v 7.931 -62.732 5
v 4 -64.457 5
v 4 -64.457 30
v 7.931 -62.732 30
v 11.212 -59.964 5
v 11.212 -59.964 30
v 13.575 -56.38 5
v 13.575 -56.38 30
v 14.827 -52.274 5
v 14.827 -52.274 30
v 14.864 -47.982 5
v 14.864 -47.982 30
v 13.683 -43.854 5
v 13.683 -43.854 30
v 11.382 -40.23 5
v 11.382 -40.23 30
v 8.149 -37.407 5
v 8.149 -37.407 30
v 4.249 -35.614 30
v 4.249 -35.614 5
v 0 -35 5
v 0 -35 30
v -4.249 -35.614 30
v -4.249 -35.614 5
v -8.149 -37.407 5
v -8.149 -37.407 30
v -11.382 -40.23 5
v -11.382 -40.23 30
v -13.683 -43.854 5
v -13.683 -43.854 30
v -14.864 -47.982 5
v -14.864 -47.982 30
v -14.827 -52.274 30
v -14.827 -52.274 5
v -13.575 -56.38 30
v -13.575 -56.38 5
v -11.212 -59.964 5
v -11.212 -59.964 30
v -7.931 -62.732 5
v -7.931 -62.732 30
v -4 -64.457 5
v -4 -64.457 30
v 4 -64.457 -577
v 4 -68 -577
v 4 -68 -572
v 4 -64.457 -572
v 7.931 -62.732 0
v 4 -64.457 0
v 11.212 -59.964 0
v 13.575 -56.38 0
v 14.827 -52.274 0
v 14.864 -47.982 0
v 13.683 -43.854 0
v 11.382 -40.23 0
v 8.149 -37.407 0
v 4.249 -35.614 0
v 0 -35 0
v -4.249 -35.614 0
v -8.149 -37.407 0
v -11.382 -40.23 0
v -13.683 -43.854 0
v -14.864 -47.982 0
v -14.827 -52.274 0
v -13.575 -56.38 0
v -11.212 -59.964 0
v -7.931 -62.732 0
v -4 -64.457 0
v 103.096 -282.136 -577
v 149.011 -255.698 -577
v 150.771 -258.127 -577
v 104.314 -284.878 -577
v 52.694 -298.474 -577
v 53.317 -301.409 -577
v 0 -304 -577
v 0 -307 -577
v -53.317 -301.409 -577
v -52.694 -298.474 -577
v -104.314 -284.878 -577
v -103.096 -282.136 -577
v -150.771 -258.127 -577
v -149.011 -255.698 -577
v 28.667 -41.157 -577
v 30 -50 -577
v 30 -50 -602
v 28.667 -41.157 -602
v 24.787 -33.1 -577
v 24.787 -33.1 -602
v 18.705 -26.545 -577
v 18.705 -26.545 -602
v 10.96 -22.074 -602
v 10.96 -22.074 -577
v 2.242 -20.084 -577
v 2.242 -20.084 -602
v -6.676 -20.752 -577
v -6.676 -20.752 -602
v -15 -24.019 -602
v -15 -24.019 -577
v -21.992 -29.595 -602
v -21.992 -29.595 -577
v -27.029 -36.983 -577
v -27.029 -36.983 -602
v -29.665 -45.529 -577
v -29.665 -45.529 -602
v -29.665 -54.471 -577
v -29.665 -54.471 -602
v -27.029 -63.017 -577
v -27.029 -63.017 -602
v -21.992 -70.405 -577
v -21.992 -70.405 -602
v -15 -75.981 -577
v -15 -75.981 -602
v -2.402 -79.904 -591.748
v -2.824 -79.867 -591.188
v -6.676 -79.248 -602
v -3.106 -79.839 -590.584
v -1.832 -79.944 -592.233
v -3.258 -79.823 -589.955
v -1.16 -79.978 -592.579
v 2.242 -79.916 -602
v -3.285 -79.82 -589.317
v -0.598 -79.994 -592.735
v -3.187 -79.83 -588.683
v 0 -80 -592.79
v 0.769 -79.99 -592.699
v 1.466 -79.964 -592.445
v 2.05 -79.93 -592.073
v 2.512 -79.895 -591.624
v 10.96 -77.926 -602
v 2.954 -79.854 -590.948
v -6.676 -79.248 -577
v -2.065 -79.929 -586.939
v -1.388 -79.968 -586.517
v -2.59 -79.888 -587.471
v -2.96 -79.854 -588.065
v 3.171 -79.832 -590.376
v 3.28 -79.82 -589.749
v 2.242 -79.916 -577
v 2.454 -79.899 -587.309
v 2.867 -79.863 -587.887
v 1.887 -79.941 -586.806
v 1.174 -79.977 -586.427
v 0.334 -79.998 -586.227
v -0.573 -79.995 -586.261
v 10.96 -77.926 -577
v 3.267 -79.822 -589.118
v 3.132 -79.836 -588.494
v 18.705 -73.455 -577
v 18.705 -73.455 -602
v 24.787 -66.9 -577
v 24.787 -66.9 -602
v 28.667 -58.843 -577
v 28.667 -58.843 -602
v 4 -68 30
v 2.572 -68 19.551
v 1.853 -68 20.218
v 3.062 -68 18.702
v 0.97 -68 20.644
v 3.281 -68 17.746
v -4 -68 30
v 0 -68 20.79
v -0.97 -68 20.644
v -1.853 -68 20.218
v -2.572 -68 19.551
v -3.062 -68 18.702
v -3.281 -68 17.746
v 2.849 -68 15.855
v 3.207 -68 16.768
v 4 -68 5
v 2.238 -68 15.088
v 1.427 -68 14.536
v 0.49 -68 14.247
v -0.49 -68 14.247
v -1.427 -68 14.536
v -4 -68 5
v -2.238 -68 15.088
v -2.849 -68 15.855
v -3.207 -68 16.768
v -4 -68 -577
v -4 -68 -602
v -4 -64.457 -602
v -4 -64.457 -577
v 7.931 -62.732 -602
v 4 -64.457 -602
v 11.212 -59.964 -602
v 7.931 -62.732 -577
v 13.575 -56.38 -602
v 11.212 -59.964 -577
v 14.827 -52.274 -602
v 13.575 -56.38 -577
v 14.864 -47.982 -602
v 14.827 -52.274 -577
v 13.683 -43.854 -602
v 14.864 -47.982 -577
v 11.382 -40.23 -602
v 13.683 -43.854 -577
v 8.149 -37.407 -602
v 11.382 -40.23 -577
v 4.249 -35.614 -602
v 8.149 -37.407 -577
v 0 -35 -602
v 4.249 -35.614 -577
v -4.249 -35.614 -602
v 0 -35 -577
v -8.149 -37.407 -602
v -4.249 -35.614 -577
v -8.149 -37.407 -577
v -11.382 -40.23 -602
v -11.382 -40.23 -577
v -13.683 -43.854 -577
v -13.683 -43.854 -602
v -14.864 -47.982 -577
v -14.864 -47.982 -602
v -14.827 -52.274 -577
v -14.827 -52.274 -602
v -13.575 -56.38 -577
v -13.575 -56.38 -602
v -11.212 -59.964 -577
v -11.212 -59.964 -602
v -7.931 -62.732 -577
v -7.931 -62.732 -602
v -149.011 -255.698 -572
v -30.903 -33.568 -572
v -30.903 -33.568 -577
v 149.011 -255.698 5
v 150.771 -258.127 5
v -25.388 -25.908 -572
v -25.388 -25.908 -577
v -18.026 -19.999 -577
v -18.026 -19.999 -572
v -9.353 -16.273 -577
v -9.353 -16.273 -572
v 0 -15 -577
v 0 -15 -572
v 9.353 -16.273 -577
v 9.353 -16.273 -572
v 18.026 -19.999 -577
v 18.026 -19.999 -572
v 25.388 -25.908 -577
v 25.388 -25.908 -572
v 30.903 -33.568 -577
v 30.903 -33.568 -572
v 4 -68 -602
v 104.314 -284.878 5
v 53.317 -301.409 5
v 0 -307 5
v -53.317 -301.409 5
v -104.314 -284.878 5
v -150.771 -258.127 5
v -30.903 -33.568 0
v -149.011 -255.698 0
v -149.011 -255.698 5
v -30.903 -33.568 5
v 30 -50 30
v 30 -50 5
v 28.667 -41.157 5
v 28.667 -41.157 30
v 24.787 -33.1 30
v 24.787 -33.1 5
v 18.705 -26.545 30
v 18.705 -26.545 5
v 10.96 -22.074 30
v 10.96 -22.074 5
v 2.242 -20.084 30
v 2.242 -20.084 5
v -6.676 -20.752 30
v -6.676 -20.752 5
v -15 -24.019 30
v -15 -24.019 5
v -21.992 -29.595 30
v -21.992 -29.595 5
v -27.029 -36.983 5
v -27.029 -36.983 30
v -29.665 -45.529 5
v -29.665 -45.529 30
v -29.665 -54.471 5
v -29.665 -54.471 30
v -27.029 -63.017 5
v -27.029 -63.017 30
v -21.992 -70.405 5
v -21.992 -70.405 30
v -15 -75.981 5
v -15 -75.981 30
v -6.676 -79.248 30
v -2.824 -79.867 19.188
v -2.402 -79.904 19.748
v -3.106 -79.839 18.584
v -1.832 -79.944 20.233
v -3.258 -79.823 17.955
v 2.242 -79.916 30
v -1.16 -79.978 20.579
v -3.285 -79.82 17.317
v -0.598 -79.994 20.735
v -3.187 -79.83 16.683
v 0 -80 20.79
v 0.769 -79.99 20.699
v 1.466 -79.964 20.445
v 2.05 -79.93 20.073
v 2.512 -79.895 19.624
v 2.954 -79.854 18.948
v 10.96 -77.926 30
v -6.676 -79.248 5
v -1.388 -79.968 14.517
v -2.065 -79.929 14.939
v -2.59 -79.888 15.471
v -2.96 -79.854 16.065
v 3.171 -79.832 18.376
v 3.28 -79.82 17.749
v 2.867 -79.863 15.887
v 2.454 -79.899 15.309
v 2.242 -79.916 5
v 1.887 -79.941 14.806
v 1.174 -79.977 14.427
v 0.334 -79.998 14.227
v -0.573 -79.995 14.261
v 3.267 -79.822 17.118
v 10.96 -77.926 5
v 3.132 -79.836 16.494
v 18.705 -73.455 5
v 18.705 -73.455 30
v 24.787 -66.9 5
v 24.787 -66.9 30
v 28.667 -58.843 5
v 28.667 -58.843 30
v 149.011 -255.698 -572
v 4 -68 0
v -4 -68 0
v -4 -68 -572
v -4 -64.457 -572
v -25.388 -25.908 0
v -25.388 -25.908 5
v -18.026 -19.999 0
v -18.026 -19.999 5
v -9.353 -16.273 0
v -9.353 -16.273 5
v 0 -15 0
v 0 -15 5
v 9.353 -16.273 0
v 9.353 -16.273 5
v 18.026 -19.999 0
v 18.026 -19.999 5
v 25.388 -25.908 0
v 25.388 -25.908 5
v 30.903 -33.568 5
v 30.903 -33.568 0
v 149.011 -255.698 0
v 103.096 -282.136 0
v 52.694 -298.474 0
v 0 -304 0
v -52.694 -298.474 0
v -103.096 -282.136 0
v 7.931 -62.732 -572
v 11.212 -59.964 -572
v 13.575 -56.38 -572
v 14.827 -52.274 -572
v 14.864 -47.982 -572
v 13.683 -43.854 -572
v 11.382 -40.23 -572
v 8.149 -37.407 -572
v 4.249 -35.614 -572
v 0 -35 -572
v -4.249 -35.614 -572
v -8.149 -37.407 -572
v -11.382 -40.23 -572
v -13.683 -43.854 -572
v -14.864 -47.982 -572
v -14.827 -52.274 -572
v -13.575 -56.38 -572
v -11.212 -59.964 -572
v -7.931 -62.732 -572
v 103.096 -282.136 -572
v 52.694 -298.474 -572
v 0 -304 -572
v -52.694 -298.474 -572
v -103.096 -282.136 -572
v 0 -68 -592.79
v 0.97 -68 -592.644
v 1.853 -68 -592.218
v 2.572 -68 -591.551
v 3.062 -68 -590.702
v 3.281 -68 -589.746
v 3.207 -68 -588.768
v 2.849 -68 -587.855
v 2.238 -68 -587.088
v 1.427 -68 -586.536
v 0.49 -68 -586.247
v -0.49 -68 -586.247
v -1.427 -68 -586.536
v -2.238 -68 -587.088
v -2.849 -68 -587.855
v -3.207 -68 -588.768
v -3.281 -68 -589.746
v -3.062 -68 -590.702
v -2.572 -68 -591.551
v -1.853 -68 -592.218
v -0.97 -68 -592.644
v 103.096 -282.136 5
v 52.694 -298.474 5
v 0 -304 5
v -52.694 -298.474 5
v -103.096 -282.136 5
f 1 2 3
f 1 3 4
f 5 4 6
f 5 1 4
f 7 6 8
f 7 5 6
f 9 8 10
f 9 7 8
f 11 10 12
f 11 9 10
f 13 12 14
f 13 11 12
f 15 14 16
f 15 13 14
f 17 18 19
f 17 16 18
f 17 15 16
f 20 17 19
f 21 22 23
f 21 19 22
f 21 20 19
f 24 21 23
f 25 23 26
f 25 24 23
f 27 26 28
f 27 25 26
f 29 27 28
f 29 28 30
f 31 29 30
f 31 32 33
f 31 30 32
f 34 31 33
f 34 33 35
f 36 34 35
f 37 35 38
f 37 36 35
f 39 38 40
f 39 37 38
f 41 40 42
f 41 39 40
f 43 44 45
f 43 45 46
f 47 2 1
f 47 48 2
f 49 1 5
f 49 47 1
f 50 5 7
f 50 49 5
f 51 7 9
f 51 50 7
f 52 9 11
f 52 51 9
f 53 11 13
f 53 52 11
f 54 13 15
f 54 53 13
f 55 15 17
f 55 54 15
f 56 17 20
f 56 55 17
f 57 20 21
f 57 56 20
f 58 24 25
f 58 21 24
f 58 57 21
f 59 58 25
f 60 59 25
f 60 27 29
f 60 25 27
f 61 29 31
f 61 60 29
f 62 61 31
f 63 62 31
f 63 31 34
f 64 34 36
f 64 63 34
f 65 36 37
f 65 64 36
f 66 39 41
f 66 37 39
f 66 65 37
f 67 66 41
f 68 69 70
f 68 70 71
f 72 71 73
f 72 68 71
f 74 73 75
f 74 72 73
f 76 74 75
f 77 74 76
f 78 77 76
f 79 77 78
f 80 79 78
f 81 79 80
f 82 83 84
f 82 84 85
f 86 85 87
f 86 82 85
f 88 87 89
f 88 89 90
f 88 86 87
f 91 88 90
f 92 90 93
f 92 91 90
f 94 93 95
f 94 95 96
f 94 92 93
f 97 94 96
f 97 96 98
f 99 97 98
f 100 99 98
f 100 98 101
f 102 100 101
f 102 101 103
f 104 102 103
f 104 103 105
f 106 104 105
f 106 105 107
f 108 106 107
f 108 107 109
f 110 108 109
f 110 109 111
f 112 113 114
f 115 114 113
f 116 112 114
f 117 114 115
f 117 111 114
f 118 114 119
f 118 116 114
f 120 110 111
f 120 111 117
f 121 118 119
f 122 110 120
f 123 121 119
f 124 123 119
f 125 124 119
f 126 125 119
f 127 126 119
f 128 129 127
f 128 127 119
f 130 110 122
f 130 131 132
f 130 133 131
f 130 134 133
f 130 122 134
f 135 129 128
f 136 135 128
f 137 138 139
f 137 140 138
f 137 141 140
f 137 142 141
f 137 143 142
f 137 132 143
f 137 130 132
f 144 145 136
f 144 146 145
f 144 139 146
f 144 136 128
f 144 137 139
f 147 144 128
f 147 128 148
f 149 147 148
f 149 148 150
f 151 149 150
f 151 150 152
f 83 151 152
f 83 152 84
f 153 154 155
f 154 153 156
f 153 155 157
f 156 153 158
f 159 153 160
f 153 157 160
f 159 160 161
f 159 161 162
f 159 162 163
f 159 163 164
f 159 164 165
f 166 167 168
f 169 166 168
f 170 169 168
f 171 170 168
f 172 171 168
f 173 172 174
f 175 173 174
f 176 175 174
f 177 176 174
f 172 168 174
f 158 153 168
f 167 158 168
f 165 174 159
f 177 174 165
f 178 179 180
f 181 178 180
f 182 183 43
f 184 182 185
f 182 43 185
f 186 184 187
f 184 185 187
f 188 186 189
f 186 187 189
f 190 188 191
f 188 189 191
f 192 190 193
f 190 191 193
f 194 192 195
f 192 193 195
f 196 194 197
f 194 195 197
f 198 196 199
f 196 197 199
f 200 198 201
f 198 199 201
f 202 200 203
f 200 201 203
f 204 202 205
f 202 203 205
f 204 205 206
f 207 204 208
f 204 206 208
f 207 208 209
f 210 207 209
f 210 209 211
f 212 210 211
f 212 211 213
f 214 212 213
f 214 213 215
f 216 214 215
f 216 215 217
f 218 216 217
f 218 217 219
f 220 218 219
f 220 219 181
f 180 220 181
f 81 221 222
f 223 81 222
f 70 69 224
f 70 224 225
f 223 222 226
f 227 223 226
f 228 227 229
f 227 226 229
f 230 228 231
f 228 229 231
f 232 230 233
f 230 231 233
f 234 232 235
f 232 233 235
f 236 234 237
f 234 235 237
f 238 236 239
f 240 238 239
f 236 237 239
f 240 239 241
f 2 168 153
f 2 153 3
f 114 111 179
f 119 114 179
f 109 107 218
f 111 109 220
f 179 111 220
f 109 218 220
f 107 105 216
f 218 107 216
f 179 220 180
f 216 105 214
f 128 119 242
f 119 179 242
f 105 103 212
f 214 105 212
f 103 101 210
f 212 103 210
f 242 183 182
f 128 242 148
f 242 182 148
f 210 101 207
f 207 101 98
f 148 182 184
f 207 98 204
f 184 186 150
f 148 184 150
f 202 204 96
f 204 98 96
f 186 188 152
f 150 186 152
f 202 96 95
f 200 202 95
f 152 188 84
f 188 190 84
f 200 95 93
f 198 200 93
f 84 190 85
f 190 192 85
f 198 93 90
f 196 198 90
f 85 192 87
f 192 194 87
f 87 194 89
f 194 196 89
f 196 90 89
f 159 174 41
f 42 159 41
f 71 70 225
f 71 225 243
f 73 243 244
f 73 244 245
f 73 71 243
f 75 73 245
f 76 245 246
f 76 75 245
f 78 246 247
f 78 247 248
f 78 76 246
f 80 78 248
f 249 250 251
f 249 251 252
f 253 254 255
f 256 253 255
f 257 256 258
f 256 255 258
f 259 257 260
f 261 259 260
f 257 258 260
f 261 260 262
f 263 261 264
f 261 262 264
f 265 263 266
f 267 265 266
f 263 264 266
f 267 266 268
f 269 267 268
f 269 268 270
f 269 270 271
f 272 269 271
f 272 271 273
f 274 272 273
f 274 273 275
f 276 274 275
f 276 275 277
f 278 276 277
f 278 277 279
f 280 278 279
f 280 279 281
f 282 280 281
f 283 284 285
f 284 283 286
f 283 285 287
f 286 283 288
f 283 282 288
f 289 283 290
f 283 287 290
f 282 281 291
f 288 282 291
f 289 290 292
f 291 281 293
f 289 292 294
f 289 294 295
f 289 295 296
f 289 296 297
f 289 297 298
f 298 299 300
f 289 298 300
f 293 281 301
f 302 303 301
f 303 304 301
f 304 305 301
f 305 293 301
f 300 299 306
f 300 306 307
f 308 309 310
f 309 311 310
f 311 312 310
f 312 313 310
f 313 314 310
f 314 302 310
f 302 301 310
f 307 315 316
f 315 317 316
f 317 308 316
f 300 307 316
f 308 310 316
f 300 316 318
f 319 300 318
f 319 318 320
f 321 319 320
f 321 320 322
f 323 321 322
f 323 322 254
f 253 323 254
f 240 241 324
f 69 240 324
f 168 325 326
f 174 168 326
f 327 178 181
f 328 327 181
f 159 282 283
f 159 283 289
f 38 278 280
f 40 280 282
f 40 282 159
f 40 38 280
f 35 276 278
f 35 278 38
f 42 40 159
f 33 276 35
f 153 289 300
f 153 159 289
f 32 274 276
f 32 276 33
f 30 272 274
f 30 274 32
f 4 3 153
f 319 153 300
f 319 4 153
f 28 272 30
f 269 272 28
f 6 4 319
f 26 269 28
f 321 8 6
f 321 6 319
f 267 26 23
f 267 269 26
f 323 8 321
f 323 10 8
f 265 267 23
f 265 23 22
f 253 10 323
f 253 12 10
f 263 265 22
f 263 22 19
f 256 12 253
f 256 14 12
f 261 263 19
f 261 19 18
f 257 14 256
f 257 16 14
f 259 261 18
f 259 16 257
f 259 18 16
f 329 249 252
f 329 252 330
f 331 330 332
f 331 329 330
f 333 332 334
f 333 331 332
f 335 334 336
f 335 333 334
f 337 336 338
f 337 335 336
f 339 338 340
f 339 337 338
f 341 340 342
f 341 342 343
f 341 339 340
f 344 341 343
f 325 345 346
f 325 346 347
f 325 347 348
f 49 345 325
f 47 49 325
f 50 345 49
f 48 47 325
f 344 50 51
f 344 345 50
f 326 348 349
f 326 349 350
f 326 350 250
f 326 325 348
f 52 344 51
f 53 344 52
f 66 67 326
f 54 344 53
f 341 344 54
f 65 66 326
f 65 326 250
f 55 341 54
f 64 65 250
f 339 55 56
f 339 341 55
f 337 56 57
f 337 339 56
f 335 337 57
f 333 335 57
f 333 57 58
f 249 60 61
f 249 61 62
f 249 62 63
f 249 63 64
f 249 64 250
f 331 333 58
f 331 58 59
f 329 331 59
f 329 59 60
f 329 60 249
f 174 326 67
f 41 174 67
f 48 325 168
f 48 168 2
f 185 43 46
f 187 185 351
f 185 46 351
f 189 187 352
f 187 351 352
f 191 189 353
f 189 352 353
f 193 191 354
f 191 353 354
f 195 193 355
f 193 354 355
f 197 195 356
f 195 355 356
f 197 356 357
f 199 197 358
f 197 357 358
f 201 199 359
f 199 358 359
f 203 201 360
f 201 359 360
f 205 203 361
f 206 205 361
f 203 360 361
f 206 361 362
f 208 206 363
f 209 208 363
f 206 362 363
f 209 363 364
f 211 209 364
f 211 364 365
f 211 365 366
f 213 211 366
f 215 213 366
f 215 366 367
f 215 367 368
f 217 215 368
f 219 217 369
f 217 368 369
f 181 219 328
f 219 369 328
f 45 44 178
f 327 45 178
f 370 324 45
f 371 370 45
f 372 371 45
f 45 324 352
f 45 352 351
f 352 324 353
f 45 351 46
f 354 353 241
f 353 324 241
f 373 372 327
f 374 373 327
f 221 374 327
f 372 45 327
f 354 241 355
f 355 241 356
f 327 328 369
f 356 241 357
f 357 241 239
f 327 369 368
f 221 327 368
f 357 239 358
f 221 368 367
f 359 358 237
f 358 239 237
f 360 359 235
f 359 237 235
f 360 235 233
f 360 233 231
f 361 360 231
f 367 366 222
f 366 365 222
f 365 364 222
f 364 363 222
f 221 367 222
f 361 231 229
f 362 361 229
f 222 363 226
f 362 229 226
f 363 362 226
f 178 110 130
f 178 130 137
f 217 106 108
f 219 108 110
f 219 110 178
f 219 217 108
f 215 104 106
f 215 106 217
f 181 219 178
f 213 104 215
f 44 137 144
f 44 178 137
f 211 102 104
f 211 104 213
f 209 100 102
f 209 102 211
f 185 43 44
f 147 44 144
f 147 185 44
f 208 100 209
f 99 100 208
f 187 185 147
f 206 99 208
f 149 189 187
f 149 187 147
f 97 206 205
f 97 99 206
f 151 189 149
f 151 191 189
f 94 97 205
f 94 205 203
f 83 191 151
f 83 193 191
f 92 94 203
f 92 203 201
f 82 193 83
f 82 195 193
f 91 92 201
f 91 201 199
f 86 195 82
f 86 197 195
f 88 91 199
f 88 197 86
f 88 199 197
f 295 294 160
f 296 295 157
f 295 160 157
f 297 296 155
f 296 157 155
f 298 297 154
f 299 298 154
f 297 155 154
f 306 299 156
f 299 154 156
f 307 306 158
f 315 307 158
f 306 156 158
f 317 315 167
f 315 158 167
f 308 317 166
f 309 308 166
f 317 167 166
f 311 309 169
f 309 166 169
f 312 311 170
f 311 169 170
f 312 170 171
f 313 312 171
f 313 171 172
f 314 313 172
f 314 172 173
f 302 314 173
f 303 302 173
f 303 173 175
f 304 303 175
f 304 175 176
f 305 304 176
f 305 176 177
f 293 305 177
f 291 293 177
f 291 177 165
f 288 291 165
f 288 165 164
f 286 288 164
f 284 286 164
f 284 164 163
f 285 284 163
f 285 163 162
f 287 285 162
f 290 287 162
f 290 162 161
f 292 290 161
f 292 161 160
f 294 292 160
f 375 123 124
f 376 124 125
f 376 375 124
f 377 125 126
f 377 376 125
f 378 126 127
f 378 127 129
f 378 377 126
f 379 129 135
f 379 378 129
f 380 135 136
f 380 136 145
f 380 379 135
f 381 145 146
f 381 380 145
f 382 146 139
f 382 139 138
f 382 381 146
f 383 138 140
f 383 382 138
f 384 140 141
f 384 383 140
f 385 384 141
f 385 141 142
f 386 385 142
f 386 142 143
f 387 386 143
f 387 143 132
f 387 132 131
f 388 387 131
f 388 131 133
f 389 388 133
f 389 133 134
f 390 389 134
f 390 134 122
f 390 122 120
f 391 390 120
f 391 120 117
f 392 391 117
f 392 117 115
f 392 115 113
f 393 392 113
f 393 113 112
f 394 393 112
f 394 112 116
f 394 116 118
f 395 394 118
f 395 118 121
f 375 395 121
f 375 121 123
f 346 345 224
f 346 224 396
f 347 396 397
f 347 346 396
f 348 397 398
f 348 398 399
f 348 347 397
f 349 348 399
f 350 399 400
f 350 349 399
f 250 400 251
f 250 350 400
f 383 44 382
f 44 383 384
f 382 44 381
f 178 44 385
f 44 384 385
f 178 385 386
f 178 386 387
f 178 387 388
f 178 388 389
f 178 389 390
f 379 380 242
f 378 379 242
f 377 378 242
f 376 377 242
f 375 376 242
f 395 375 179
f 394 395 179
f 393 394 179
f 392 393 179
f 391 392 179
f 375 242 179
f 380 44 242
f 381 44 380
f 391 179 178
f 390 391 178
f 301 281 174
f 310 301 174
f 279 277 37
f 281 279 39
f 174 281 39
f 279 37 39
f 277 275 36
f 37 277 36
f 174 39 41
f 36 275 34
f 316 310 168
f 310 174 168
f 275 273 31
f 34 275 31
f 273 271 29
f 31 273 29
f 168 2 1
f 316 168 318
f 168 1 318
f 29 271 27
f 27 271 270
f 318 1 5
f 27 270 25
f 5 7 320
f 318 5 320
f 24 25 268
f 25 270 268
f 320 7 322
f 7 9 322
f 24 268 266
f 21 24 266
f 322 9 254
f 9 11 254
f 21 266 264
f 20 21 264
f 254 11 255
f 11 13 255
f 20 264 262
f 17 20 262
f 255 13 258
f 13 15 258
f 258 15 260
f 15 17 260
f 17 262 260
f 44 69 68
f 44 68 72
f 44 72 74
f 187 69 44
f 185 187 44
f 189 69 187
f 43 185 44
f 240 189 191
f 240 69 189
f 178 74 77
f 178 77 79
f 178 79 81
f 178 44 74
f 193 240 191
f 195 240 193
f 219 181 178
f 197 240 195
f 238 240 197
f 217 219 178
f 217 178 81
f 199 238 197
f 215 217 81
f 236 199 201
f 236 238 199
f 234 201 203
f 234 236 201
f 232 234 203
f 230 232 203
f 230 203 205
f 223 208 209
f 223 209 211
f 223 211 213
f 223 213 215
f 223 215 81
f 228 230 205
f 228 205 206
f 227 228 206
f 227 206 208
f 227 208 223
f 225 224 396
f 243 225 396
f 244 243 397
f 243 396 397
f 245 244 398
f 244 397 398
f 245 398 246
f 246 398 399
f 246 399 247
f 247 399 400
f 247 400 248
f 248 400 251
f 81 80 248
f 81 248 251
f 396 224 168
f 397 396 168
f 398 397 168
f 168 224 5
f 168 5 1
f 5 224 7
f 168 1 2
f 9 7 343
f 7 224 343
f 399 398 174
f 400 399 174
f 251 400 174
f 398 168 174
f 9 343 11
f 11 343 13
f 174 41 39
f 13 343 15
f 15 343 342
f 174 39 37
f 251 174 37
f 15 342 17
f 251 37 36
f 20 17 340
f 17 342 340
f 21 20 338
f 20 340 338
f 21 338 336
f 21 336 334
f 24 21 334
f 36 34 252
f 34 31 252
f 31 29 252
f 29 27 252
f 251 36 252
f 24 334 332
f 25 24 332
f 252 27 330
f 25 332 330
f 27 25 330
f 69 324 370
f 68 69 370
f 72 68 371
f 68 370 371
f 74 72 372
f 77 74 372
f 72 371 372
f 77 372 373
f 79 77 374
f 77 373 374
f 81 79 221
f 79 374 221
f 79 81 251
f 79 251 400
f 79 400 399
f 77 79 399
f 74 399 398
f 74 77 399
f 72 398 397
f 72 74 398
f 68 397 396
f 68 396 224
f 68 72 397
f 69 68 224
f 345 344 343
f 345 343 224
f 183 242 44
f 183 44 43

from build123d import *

# Parameters (mm, degrees)
SKETCH1_R           = 15
BOSS_EXTRUDE1_DEPTH = 5
SKETCH2_R           = 30
SKETCH2_R_2         = 15
BOSS_EXTRUDE2_DEPTH = 25
SKETCH3_R           = 3.289745787
CUT_EXTRUDE1_DEPTH  = 43
BASE_FLANGE1_START  = -582
BASE_FLANGE1_DEPTH  = 582
SKETCH6_W           = 8
SKETCH6_H           = 26.362686856
CUT_EXTRUDE2_DEPTH  = 719.613259004


# Sheet-metal steps are written as plain solids
with BuildPart() as part:
    # Sketch1 → Boss-Extrude1 (new body)
    with BuildSketch(Plane.XY):
        with BuildLine():
            Line((-149.011425297, -255.697824808), (-30.90316575, -33.568495302))
            ThreePointArc((-30.90316575, -33.568495302), (0, -15), (30.90316575, -33.568495302))
            Line((30.90316575, -33.568495302), (149.011425297, -255.697824808))
            ThreePointArc((149.011425297, -255.697824808), (0, -304), (-149.011425297, -255.697824808))
        make_face()
        with Locations((0, -50)):
            Circle(SKETCH1_R, mode=Mode.SUBTRACT)
    extrude(amount=BOSS_EXTRUDE1_DEPTH)


with BuildPart() as body_2:
    # Sketch2 → Boss-Extrude2 (new body)
    with BuildSketch(Plane.XY.offset(5)):
        with Locations((0, -50)):
            Circle(SKETCH2_R)
        with Locations((0, -50)):
            Circle(SKETCH2_R_2, mode=Mode.SUBTRACT)
    extrude(amount=BOSS_EXTRUDE2_DEPTH)

    # Sketch3 → Cut-Extrude1 (cut)
    with BuildSketch(Plane(origin=(0, -50, 0), x_dir=(1, 0, 0), z_dir=(0, 1, 0))):
        with Locations(Location((0, -17.5, 0), (0, 0, 270))):
            Circle(SKETCH3_R)
    extrude(amount=-CUT_EXTRUDE1_DEPTH, mode=Mode.SUBTRACT)


with BuildPart() as body_3:
    # Mirror7: mirrored copy
    add(part.part.mirror(Plane(origin=(0, 0, -286), x_dir=(1, 0, 0), z_dir=(0, 0, -1))))


with BuildPart() as body_4:
    # Mirror7 2: mirrored copy
    add(body_2.part.mirror(Plane(origin=(0, 0, -286), x_dir=(1, 0, 0), z_dir=(0, 0, -1))))


with BuildPart() as body_5:
    # Sketch5 → Base-Flange1 (new body)
    with BuildSketch(Plane.XY.offset(5).offset(BASE_FLANGE1_START)):
        with BuildLine():
            ThreePointArc((-149.011425297, -255.697824808), (0, -304), (149.011425297, -255.697824808))
            Line((149.011425297, -255.697824808), (150.771402761, -258.127326676))
            ThreePointArc((150.771402761, -258.127326676), (0, -307), (-150.771402761, -258.127326676))
            Line((-150.771402761, -258.127326676), (-149.011425297, -255.697824808))
        make_face()
    extrude(amount=BASE_FLANGE1_DEPTH)


with BuildPart() as cut_extrude2_tool:
    # Sketch6 → Cut-Extrude2 (new, through all)
    with BuildSketch(Plane(origin=(0, 0, -602), x_dir=(-1, 0, 0), z_dir=(0, 0, -1))):
        with Locations((0, -54.818656572)):
            Rectangle(SKETCH6_W, SKETCH6_H)
    extrude(amount=-CUT_EXTRUDE2_DEPTH)


with BuildPart() as part_1:
    add(part.part)

    # Cut-Extrude2: cut by cut_extrude2_tool
    add(cut_extrude2_tool.part, mode=Mode.SUBTRACT)


with BuildPart() as body_2_1:
    add(body_2.part)

    # Cut-Extrude2: cut by cut_extrude2_tool
    add(cut_extrude2_tool.part, mode=Mode.SUBTRACT)


with BuildPart() as body_3_1:
    add(body_3.part)

    # Cut-Extrude2: cut by cut_extrude2_tool
    add(cut_extrude2_tool.part, mode=Mode.SUBTRACT)


with BuildPart() as body_4_1:
    add(body_4.part)

    # Cut-Extrude2: cut by cut_extrude2_tool
    add(cut_extrude2_tool.part, mode=Mode.SUBTRACT)


solid = Compound([body_5.part, part_1.part, body_2_1.part, body_3_1.part, body_4_1.part])
